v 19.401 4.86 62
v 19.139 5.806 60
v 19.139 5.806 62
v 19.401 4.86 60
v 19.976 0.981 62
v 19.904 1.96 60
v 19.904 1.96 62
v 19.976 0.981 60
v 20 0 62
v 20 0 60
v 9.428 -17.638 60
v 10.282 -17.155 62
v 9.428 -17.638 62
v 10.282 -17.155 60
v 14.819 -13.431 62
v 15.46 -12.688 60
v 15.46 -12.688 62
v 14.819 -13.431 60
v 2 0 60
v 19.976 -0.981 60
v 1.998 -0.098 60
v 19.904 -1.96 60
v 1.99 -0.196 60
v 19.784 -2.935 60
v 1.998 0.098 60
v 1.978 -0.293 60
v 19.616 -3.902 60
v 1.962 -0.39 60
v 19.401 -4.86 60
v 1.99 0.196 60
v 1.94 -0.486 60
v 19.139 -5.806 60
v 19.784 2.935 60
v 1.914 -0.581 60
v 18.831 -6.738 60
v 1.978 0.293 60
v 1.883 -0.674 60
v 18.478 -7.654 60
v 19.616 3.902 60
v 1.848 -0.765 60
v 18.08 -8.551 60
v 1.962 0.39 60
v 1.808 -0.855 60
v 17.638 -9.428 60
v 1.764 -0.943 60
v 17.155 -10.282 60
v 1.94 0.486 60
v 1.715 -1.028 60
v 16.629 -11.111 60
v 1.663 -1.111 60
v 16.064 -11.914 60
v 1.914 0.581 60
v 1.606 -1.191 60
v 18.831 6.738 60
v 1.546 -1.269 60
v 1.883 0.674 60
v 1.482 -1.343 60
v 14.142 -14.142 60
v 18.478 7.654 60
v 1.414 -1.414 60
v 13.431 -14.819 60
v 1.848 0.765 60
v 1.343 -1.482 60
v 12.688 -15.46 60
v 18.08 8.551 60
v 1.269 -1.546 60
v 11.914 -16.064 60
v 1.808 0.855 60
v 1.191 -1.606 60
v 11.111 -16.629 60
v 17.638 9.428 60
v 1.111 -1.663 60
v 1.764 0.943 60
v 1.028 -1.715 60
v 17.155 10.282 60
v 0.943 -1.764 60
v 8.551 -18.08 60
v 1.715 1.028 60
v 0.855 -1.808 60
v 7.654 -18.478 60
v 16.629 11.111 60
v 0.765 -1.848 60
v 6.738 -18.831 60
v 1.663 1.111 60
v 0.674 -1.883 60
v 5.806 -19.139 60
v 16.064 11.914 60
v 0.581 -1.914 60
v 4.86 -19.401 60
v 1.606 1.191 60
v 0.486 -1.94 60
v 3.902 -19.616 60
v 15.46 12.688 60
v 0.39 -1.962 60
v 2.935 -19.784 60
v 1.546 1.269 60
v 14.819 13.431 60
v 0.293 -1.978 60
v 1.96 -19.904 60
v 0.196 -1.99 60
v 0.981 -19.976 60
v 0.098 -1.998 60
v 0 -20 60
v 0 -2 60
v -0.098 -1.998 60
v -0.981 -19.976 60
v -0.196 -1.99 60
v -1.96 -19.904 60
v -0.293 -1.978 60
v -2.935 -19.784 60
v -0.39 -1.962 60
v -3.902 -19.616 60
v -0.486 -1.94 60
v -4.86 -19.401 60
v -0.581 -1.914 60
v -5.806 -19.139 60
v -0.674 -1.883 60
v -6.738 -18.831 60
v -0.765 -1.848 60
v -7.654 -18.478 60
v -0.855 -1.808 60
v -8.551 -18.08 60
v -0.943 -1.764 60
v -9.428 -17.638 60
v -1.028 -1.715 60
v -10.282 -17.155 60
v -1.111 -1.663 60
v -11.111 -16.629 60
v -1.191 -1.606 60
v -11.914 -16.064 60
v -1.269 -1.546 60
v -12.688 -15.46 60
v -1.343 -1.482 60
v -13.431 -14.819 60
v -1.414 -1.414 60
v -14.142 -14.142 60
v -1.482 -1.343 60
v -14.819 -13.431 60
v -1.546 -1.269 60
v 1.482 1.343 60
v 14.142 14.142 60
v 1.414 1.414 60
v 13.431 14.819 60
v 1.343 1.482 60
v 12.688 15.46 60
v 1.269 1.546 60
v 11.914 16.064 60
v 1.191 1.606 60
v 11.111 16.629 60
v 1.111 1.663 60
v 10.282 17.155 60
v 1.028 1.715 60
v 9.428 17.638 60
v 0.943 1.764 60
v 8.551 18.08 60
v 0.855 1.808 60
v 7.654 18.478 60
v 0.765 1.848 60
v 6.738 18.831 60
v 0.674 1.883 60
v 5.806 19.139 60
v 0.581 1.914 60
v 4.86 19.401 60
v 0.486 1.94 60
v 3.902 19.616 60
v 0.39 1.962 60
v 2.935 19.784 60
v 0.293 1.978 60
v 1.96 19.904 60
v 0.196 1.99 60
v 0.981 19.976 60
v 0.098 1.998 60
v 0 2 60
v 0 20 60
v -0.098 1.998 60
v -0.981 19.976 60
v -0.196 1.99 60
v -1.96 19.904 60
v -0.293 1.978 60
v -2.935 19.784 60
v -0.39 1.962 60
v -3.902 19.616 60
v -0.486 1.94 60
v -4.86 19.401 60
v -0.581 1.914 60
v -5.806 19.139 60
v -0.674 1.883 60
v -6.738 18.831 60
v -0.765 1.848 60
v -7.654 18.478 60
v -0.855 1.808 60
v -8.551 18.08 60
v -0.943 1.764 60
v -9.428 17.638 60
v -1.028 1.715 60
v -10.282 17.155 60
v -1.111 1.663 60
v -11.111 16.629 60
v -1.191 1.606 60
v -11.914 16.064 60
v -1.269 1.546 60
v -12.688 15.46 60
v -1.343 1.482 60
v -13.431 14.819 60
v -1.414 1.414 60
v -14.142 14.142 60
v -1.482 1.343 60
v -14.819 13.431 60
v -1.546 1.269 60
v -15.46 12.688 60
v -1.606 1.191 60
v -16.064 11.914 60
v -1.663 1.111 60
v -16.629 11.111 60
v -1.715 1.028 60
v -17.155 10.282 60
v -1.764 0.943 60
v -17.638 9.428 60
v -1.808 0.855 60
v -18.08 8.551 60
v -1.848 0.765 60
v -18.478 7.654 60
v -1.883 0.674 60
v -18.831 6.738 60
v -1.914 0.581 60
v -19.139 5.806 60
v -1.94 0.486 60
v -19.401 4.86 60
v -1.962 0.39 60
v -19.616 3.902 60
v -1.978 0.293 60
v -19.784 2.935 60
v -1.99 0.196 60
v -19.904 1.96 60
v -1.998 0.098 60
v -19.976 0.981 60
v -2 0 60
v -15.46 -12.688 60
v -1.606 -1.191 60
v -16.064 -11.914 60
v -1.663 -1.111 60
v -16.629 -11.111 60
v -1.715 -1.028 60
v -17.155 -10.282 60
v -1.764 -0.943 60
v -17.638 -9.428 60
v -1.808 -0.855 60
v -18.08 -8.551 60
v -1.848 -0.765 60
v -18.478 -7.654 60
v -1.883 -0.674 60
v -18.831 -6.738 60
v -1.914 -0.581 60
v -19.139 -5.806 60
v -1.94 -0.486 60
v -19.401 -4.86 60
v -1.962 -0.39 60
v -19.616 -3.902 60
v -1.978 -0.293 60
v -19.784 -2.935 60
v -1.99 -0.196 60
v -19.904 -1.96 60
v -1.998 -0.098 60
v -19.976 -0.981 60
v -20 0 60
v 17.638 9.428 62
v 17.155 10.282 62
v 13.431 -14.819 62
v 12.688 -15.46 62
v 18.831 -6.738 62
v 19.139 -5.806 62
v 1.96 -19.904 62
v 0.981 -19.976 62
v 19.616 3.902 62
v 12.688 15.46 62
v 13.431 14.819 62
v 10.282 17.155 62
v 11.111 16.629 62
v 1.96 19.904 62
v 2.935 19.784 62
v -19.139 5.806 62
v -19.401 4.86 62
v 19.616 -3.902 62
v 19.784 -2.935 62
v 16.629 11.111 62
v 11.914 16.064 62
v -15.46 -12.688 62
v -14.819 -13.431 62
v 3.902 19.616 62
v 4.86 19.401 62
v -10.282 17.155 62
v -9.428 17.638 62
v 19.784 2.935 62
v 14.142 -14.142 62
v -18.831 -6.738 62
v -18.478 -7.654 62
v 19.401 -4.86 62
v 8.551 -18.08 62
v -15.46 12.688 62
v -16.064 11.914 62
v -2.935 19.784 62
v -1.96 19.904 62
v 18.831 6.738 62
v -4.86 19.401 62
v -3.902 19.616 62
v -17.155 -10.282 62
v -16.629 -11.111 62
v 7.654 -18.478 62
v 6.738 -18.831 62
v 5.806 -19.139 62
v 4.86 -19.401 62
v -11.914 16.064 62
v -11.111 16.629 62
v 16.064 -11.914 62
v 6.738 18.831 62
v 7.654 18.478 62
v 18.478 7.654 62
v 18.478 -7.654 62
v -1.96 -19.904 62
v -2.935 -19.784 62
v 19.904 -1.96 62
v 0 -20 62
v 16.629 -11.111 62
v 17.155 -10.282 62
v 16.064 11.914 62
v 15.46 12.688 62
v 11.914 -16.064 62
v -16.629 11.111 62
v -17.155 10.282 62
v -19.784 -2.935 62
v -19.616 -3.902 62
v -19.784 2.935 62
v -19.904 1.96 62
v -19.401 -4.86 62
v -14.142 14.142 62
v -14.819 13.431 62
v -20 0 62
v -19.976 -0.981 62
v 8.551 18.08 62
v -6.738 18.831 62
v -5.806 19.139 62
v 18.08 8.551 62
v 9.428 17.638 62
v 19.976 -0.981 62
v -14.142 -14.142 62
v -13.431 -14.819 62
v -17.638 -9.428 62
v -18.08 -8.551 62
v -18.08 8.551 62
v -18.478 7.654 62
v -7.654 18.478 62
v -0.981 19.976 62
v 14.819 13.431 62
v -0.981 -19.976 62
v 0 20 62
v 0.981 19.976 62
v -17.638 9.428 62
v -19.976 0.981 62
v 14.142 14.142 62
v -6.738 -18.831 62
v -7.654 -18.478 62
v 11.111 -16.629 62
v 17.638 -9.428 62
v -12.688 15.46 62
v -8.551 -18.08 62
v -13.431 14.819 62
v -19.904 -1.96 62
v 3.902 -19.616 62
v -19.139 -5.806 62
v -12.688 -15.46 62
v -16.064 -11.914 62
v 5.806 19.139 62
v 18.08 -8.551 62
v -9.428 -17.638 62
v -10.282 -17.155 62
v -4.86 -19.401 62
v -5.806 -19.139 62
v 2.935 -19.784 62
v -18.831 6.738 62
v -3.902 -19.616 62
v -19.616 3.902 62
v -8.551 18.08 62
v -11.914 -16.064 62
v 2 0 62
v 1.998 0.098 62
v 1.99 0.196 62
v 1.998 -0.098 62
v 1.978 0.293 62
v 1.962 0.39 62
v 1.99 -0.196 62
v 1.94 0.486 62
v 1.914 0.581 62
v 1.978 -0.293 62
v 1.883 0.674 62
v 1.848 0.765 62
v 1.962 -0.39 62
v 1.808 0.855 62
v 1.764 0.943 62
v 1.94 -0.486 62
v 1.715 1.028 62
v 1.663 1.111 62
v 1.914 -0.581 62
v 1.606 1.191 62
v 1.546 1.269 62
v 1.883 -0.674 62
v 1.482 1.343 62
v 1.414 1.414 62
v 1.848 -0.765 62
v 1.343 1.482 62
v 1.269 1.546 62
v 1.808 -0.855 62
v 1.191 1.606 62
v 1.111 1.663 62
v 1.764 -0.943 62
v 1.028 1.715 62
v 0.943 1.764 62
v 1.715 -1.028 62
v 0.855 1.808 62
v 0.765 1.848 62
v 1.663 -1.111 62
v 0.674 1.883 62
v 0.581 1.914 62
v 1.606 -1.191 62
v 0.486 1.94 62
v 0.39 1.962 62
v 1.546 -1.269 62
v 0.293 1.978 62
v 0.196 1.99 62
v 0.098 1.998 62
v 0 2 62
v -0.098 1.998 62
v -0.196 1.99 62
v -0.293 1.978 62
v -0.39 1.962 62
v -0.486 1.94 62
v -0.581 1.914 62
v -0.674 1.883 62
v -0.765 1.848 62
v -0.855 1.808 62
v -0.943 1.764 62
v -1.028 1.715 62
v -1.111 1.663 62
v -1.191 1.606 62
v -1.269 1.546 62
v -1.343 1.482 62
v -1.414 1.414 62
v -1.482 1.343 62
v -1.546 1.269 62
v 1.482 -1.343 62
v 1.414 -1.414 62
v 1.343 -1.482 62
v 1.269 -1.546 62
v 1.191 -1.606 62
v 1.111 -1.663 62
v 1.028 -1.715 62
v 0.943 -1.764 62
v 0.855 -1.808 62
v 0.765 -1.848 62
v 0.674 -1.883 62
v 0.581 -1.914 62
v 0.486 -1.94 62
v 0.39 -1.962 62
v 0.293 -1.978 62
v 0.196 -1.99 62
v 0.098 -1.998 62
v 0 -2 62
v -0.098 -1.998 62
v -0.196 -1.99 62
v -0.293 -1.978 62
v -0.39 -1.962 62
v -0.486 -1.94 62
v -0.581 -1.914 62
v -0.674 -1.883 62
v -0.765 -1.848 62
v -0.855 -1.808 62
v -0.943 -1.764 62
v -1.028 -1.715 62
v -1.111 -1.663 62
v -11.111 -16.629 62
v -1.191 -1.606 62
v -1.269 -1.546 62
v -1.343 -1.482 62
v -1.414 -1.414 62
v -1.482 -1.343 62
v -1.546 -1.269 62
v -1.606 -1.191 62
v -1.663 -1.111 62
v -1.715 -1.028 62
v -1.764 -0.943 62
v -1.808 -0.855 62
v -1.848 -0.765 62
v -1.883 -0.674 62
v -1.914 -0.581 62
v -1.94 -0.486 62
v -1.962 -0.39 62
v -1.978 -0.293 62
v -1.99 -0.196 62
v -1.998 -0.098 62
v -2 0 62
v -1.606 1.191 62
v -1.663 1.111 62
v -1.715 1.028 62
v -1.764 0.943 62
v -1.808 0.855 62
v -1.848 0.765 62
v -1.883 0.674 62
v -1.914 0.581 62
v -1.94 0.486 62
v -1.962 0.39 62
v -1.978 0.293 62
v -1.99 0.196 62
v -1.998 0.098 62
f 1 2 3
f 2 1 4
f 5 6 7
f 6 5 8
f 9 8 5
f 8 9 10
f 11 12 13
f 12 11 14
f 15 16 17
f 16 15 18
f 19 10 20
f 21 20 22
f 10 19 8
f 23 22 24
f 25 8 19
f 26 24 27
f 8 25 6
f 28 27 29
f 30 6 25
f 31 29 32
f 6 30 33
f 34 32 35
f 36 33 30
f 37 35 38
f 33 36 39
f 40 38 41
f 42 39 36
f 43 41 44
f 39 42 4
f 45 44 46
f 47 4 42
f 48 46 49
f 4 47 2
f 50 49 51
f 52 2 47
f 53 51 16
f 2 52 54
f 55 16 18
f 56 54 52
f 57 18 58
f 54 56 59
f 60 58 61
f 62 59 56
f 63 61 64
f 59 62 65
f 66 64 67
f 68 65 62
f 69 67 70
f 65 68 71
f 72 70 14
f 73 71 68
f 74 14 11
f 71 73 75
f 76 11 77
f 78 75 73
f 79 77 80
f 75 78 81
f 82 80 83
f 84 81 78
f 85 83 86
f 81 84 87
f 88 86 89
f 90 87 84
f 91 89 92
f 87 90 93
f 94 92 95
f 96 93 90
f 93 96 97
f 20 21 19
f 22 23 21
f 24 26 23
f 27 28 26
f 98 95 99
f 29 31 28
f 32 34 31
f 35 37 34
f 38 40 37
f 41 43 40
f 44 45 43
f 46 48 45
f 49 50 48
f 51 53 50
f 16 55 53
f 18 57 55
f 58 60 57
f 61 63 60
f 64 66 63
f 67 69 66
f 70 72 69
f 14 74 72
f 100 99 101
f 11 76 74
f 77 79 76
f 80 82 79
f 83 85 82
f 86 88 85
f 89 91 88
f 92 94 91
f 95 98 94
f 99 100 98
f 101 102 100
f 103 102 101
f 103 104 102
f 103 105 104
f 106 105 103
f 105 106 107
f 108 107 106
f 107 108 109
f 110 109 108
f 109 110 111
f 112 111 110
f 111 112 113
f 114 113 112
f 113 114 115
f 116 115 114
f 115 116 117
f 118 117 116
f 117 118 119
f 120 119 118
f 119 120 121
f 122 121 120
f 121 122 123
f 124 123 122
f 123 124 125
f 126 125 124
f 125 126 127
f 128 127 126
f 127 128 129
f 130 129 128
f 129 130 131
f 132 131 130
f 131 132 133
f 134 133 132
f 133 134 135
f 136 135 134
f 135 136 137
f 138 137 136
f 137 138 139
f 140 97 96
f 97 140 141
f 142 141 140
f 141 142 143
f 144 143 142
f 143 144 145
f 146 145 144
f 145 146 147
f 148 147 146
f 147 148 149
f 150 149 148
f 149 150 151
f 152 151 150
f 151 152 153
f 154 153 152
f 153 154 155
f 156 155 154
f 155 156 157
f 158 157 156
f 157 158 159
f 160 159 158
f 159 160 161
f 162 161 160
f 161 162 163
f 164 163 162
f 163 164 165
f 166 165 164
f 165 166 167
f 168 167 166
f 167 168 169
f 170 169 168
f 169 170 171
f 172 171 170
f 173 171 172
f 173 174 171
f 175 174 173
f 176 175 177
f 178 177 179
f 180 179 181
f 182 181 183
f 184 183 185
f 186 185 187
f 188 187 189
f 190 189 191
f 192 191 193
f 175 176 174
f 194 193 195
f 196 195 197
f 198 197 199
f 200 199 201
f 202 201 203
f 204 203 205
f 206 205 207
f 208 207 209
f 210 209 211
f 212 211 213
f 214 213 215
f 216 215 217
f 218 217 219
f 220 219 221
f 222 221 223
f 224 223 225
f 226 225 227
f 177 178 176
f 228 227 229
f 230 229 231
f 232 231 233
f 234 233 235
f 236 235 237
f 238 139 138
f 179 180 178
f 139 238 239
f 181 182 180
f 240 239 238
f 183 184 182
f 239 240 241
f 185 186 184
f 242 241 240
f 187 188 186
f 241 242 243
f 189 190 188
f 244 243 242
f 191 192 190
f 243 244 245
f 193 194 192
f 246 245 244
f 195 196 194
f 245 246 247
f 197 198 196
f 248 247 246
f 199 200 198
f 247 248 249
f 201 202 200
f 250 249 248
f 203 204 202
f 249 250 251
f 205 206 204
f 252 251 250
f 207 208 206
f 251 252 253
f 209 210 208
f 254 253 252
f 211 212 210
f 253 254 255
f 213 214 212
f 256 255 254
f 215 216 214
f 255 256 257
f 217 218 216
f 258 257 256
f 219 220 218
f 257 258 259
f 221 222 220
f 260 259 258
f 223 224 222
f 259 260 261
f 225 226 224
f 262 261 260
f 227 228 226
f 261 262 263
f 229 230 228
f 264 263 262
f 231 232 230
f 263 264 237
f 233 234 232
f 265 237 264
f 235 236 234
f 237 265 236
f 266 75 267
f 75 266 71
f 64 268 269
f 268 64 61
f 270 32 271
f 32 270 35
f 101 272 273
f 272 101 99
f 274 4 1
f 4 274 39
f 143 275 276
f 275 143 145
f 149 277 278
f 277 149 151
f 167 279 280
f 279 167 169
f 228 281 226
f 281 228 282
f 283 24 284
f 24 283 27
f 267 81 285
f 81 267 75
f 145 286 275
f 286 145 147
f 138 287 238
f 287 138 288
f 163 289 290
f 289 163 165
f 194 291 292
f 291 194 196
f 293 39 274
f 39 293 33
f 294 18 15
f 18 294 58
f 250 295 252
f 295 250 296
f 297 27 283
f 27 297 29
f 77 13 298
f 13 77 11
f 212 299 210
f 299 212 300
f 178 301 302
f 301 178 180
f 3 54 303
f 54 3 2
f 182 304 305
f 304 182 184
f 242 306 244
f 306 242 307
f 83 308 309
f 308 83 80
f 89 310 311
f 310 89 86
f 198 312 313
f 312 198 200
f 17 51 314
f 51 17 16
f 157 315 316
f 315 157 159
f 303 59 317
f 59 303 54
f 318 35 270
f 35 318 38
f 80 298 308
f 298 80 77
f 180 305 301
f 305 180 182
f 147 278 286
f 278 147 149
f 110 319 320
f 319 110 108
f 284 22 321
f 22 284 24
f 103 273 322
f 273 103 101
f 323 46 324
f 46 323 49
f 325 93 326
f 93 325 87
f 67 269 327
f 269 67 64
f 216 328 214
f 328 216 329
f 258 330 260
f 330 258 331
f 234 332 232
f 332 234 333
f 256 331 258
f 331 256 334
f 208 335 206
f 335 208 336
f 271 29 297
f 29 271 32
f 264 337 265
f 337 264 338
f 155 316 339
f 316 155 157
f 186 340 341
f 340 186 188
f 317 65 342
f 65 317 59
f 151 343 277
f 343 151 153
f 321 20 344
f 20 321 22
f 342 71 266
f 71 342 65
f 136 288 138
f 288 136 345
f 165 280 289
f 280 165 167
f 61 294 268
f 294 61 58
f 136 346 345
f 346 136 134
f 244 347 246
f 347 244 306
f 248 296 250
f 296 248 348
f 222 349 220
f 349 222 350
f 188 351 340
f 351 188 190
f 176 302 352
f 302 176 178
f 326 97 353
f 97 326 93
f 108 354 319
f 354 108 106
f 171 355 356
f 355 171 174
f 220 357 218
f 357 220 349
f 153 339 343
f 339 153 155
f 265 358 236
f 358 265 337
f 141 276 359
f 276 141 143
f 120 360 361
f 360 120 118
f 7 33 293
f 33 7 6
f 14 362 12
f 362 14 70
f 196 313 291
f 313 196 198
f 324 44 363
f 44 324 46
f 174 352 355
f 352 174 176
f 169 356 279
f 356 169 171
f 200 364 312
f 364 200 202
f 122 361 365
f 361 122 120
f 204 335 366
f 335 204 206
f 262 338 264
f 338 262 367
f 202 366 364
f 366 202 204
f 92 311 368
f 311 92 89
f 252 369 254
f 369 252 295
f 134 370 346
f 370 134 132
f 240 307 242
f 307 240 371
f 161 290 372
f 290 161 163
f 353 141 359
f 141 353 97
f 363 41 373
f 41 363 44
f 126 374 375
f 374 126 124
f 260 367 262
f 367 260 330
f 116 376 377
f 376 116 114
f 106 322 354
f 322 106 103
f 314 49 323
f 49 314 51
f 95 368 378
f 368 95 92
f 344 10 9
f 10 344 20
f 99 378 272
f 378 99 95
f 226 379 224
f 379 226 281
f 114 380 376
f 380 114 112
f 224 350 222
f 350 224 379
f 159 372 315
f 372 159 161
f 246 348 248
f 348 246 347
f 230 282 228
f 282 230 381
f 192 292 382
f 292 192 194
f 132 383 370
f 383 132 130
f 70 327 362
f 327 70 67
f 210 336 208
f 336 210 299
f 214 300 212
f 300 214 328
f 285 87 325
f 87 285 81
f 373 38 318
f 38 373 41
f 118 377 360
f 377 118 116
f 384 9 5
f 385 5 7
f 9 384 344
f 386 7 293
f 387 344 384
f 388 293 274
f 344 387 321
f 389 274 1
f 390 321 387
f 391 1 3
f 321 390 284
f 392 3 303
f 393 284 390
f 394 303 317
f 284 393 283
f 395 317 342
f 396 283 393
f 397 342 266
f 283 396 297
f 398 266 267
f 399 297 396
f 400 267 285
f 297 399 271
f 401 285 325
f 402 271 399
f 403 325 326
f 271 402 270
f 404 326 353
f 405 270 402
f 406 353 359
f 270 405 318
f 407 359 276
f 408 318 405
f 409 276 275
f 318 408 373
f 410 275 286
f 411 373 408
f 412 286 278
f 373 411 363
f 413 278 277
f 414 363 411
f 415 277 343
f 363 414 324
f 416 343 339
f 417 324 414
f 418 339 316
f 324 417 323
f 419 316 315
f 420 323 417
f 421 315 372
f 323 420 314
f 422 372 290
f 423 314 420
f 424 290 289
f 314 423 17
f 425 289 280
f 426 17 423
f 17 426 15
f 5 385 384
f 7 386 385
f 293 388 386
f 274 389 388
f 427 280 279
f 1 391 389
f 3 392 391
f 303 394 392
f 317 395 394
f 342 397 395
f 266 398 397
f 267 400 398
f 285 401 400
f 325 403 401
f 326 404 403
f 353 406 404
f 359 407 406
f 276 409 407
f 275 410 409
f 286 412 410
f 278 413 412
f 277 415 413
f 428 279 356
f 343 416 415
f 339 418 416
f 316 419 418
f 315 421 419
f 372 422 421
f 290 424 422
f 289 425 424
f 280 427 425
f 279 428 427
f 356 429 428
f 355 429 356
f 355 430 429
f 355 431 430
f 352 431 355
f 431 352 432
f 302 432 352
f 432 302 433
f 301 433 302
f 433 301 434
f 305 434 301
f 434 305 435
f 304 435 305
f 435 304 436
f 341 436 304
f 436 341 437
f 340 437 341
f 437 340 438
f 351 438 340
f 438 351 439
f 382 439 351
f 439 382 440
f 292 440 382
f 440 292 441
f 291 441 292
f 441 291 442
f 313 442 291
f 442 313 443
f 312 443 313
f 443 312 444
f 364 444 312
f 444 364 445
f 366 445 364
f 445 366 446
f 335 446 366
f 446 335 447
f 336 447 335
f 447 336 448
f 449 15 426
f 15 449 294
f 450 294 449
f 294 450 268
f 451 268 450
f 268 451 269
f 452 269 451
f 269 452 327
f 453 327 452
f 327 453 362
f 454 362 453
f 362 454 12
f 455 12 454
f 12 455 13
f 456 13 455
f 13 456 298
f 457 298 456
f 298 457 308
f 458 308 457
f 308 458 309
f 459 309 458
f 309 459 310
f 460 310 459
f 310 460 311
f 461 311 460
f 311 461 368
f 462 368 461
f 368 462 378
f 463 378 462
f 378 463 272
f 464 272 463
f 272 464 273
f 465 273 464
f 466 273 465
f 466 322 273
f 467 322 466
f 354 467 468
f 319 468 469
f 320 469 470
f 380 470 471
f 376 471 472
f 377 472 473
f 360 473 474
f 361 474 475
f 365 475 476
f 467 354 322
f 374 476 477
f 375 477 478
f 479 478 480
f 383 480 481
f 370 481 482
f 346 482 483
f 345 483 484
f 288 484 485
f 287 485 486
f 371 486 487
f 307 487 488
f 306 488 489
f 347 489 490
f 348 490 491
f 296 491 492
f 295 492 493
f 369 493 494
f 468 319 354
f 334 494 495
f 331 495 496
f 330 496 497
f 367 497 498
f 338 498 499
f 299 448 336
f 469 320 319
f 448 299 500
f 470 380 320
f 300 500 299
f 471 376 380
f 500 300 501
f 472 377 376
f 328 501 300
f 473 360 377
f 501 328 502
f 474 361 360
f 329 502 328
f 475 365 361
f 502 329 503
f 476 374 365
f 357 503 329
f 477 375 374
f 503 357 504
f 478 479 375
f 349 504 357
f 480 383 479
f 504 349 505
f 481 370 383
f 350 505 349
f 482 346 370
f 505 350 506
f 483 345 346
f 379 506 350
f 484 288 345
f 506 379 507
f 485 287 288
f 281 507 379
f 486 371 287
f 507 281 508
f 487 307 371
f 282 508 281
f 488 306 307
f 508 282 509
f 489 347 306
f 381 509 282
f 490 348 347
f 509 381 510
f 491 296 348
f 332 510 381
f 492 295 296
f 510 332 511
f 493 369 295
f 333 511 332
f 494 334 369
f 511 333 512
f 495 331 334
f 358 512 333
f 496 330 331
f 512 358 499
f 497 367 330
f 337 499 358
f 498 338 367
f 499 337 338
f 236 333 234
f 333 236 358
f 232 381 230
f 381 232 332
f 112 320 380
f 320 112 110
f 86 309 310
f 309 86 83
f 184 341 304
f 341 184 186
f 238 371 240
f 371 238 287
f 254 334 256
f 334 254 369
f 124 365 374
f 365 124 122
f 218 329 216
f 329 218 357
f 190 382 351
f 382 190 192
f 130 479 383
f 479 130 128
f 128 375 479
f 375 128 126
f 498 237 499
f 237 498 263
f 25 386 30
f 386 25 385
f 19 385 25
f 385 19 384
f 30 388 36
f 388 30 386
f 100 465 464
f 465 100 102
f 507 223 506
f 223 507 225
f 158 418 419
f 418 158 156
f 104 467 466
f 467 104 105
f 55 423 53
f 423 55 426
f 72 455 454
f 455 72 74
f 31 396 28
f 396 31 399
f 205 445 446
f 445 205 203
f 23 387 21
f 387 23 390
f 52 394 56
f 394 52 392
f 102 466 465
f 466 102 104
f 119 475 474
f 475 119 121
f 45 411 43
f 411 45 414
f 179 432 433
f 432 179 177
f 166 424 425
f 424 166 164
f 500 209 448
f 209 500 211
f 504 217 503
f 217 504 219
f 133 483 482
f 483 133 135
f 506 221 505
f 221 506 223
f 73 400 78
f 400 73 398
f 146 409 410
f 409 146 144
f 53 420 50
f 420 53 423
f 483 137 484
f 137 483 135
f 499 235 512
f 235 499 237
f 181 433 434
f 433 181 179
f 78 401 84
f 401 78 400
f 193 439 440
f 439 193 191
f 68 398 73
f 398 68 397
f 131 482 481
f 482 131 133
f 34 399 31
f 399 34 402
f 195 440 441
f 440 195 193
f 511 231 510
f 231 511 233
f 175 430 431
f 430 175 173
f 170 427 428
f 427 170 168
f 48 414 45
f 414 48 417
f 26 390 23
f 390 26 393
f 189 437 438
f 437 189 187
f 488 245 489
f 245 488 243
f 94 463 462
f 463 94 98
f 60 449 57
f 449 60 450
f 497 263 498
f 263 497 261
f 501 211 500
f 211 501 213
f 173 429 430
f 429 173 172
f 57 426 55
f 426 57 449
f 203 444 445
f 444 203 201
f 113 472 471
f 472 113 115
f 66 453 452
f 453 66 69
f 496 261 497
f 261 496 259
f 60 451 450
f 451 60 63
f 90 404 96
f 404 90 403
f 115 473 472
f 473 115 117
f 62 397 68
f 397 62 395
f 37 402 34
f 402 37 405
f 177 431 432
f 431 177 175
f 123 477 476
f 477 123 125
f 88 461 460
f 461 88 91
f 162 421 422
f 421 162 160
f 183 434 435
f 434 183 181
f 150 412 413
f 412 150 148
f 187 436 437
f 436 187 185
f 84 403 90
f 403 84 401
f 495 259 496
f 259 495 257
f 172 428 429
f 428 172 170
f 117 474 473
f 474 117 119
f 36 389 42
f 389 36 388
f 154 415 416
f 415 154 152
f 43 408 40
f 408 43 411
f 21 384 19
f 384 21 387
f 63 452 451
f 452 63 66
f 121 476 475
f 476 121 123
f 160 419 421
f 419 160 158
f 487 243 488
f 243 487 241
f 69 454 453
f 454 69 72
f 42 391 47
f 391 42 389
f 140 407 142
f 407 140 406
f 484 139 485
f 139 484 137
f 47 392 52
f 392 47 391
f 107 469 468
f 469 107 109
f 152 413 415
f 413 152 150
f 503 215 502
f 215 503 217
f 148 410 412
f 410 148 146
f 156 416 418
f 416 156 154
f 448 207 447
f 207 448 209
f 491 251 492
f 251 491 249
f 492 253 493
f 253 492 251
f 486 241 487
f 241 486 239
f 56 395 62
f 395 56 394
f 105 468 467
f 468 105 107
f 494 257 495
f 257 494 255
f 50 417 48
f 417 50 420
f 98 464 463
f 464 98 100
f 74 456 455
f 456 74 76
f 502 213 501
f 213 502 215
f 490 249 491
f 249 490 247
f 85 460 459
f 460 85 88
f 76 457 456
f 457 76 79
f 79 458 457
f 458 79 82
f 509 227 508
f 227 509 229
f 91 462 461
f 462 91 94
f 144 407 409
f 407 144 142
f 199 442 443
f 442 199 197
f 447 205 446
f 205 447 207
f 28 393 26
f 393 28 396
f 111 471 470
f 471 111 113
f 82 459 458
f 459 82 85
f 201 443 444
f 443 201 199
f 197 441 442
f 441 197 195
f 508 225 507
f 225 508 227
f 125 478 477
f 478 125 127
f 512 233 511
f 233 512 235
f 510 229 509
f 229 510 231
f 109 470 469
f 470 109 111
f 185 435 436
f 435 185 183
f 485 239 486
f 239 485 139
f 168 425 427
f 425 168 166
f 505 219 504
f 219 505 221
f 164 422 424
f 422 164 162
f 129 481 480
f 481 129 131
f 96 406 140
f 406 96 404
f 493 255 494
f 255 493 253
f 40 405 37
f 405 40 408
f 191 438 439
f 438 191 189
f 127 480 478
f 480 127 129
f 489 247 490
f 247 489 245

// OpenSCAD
// file: common_params.scad
cylinder_radius = 20.000000;
cylinder_height = 60.000000;
wall_thickness = 2.000000;

cap_thickness = 2.000000;

rod_radius = 2.000000;
rod_height = 50.000000;

ring_outer_radius = 8.000000;
ring_inner_radius = 4.000000;
ring_thickness = 3.000000;
ring_z = 40.000000;

$fn = 128;
// main file
include <common_params.scad>;

hole_radius = 2.000000;

translate([0, 0, cylinder_height])
difference() {
    cylinder(h = cap_thickness, r = cylinder_radius);
    translate([0, 0, -0.1])
        cylinder(h = cap_thickness + 0.2, r = hole_radius);
}
